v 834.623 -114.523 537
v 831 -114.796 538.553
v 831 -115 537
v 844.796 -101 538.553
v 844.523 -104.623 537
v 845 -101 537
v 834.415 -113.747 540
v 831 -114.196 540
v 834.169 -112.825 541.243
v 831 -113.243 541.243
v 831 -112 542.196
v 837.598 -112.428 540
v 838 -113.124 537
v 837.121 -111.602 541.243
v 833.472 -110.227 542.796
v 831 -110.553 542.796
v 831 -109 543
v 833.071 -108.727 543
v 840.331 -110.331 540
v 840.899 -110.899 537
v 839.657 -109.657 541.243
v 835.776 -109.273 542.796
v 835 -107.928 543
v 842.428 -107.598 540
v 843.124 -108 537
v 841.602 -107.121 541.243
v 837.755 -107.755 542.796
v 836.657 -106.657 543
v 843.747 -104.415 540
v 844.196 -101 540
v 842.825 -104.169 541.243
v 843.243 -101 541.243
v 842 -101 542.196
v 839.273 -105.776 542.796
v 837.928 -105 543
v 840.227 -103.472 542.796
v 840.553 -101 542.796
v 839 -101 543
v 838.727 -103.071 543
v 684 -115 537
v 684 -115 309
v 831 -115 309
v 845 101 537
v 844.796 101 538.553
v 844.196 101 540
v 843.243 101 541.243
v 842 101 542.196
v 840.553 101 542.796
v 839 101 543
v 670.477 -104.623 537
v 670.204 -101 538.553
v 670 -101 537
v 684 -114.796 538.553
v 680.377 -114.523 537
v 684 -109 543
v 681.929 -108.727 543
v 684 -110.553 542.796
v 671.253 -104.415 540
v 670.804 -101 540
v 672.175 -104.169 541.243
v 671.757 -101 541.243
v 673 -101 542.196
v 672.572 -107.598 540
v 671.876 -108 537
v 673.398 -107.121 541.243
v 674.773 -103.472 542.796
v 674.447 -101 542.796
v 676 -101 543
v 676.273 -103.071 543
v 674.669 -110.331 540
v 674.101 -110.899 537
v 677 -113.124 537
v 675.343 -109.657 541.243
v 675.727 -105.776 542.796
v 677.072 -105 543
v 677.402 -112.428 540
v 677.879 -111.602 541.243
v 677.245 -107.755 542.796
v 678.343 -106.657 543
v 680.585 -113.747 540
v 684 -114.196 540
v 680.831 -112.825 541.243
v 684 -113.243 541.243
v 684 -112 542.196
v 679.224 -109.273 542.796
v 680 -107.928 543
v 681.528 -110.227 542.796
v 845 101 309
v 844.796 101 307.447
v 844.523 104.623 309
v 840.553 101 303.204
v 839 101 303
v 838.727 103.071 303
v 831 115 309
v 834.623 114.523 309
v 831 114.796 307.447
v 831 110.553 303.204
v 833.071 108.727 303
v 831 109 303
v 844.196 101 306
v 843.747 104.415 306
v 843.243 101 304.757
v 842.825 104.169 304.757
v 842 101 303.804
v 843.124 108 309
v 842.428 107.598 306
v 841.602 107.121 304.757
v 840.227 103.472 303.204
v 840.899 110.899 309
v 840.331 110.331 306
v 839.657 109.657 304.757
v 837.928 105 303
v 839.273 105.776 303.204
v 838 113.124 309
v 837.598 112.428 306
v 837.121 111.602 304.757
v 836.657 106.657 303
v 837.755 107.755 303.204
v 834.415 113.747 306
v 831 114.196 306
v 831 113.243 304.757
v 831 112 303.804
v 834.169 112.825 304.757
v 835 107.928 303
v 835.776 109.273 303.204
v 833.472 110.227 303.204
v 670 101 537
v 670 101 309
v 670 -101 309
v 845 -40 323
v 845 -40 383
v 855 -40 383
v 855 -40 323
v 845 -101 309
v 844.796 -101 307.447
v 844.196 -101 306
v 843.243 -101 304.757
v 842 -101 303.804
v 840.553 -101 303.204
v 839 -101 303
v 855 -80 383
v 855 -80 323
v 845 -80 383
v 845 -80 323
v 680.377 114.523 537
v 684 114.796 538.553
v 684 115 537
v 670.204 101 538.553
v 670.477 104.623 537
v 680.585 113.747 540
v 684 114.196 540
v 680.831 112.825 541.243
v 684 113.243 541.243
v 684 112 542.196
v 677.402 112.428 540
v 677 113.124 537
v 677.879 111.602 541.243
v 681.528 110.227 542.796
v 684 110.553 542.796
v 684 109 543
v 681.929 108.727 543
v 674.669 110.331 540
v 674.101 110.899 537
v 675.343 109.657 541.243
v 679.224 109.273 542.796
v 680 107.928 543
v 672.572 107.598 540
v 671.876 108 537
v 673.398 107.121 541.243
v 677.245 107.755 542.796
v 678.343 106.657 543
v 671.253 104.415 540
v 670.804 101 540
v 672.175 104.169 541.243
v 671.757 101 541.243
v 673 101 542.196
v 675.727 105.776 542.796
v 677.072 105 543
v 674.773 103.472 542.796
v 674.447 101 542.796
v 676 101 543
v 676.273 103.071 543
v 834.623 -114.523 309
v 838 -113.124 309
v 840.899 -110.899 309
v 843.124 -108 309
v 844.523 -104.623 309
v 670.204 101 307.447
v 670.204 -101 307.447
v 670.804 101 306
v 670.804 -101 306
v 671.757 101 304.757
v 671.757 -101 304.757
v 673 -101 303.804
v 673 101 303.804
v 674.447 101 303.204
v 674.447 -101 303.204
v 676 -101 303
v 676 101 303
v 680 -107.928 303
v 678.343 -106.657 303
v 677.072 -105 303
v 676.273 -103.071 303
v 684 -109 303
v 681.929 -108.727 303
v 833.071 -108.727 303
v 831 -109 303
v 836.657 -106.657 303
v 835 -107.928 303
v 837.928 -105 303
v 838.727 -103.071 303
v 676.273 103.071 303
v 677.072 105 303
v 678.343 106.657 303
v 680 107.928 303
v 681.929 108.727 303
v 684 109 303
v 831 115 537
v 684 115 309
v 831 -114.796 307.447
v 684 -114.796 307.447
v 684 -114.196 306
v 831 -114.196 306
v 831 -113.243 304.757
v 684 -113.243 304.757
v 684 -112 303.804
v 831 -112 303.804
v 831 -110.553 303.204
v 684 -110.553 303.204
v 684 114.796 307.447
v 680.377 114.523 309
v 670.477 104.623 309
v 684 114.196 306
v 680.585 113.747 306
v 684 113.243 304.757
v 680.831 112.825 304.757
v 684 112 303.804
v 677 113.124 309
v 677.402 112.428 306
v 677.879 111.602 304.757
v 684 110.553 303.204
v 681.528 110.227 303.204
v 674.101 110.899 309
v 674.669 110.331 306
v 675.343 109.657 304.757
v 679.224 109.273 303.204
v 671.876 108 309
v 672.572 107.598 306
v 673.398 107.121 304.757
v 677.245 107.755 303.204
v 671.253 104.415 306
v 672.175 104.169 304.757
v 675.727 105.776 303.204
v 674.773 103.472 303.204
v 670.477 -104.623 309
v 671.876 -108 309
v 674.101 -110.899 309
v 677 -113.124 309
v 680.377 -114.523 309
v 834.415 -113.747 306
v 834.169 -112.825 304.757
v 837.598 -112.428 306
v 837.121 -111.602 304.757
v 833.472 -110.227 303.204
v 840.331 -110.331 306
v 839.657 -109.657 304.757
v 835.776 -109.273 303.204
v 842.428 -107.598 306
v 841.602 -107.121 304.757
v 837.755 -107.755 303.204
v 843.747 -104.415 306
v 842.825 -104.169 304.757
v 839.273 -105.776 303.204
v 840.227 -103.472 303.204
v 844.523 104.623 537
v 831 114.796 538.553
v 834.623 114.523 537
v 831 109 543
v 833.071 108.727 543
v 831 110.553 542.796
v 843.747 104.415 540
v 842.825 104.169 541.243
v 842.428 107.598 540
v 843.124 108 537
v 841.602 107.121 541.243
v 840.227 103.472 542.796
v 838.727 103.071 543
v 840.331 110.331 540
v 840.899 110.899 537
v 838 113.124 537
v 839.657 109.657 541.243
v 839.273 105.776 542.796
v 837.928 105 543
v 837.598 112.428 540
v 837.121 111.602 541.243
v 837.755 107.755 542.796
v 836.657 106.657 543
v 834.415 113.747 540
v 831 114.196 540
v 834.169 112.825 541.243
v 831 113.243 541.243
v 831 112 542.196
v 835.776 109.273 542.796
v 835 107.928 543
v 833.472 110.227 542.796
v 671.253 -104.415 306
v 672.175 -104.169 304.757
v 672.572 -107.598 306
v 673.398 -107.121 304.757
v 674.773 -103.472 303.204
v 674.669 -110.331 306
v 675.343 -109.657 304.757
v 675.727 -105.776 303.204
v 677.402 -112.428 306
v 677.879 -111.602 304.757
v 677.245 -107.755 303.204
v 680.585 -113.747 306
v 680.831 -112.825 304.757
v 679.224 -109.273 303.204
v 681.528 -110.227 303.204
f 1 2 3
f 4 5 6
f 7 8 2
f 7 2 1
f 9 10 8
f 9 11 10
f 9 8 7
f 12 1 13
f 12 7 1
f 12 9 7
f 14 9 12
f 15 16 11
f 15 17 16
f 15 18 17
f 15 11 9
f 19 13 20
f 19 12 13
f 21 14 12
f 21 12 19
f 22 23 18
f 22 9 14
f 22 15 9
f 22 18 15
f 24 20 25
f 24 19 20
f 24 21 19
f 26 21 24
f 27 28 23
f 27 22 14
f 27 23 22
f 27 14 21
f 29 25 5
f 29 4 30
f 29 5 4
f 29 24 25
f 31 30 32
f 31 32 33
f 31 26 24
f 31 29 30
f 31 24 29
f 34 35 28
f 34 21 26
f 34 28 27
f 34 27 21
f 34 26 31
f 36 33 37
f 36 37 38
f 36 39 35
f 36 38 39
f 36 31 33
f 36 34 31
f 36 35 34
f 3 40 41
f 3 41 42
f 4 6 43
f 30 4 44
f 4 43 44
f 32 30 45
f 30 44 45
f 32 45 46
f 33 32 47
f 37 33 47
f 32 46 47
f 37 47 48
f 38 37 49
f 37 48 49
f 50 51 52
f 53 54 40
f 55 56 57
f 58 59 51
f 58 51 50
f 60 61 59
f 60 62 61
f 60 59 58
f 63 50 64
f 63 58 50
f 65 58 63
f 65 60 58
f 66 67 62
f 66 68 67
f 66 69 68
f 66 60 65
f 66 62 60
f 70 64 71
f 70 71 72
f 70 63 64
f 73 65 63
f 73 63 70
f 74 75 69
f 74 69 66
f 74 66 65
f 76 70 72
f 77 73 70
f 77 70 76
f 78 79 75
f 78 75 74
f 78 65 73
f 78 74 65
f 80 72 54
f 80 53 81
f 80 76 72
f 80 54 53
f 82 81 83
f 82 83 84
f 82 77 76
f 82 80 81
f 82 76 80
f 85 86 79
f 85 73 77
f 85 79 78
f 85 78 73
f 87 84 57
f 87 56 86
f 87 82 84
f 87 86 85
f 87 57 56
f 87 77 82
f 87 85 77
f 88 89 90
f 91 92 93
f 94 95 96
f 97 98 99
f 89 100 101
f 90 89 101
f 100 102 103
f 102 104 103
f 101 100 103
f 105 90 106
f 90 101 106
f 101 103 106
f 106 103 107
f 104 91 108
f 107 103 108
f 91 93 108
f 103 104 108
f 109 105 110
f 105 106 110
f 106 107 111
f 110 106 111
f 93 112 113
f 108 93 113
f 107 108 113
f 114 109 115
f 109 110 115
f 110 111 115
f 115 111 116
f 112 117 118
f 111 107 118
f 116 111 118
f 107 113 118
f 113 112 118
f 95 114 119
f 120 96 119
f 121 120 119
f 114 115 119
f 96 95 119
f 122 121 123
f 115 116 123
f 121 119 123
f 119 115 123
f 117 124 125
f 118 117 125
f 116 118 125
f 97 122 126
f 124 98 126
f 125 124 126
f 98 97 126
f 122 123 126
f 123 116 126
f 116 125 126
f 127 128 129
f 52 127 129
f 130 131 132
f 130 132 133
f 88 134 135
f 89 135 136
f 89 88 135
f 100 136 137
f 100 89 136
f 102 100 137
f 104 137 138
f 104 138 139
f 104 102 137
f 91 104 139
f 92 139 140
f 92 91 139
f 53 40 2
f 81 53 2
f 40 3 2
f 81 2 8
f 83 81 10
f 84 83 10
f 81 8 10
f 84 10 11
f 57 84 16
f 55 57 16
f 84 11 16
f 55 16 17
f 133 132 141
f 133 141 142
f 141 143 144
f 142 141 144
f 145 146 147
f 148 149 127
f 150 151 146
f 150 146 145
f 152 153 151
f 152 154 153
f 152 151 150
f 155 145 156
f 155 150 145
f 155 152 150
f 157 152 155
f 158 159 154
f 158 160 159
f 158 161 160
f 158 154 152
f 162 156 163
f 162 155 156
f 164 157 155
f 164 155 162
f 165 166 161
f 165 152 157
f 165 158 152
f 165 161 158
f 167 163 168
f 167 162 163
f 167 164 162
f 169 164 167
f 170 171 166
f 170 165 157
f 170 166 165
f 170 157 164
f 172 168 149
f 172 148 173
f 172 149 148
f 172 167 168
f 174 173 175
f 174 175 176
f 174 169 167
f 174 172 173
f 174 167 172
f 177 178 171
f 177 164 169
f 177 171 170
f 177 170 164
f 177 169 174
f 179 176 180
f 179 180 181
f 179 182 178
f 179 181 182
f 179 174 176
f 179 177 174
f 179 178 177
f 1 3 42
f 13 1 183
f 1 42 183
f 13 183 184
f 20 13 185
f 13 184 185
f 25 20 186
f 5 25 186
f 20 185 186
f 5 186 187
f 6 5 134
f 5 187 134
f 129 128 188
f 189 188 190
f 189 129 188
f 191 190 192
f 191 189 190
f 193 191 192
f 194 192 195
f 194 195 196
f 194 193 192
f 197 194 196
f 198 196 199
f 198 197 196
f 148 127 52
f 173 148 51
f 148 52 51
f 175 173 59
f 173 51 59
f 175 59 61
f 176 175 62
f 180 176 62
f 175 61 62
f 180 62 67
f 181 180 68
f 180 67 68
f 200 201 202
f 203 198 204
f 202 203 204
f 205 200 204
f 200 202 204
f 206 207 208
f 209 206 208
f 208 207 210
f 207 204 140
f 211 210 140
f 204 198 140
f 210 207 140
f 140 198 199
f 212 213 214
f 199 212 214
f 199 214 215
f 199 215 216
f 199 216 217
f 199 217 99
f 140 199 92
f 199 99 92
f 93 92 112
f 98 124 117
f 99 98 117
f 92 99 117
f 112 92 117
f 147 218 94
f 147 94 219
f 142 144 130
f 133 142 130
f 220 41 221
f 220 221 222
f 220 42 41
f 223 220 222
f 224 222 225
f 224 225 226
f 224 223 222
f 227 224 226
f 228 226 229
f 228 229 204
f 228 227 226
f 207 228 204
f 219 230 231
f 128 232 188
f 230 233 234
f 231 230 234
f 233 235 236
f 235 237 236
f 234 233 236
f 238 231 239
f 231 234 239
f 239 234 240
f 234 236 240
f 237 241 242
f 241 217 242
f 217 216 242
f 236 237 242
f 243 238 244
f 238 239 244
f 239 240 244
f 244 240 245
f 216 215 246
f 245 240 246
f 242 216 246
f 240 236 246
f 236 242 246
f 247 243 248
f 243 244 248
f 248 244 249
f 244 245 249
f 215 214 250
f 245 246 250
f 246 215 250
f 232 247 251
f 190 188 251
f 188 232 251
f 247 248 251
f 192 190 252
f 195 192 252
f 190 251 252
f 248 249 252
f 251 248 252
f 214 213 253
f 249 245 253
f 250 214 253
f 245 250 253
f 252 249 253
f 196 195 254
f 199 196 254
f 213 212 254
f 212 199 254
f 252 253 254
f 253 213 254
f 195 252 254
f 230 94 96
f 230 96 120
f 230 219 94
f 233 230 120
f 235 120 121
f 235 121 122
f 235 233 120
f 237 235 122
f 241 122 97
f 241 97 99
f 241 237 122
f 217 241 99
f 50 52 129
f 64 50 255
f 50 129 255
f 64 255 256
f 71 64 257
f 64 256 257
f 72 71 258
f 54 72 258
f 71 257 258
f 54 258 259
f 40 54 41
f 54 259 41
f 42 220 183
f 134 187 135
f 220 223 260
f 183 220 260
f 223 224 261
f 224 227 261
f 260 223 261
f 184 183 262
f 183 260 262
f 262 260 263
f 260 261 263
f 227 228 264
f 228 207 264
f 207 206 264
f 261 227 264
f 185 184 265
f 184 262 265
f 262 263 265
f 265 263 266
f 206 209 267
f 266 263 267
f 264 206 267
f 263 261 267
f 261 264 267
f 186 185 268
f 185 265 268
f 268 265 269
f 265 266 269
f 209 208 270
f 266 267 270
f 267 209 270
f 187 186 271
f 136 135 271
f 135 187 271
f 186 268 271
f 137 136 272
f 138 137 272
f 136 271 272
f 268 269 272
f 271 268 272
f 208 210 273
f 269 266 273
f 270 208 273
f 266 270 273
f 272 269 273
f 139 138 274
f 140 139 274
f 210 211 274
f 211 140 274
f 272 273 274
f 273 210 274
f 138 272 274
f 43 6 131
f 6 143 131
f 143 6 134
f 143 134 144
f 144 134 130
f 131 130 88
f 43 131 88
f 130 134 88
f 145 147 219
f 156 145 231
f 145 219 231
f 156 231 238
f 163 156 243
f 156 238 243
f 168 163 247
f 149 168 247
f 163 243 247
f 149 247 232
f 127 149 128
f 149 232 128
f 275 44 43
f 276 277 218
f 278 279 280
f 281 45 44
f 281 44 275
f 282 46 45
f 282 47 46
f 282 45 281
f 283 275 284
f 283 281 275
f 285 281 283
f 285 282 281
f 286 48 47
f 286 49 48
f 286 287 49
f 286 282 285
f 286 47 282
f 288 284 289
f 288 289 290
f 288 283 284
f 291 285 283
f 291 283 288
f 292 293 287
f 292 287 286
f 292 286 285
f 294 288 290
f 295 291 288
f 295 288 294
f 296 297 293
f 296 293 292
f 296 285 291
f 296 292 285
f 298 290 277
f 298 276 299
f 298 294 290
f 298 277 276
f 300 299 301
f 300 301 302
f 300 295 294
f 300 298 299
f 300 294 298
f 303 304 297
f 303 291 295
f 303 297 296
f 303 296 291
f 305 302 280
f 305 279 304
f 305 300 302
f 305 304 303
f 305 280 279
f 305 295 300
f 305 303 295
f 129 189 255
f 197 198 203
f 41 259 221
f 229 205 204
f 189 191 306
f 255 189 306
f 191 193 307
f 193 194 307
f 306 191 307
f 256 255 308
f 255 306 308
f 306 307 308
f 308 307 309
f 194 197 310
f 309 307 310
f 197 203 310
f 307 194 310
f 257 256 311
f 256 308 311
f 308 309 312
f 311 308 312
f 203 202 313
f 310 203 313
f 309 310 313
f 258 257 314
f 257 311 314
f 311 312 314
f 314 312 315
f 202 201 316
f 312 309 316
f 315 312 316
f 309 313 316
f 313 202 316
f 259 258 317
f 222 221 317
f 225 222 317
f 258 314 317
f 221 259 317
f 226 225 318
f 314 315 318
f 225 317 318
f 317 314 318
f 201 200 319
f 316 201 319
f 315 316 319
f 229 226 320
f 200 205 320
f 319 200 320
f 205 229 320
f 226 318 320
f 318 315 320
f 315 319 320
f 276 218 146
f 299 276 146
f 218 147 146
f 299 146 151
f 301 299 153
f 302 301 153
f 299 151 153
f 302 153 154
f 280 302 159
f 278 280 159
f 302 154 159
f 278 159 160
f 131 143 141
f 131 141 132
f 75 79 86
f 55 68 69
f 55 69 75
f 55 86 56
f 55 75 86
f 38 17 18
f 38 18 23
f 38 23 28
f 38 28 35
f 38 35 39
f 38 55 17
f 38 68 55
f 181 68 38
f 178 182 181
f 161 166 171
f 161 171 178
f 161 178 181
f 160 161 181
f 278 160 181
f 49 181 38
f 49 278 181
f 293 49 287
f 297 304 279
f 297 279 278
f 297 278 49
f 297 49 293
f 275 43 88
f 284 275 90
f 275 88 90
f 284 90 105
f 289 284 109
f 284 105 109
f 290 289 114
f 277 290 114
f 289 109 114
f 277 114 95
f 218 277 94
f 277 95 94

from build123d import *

# Parameters (mm, degrees)
BLOCK_START            = 303
BLOCK_1_DEPTH          = 240
BLOCK_EDGE_FILLET_1_R  = 6
EXTRUDE_SKETCH_1_W     = 60
EXTRUDE_SKETCH_1_H     = 40
EXTRUDE_1_DEPTH        = 10
EXTRUDE_ROTATE_1_ANGLE = 90


with BuildPart() as part:
    # Block sketch 1 → Block 1 (new body)
    with BuildSketch(Plane.XY.offset(BLOCK_START)):
        with BuildLine():
            Line((684, -115), (831, -115))
            ThreePointArc((831, -115), (840.899494937, -110.899494937), (845, -101))
            Line((845, -101), (845, 101))
            ThreePointArc((845, 101), (840.899494937, 110.899494937), (831, 115))
            Line((831, 115), (684, 115))
            ThreePointArc((684, 115), (674.100505063, 110.899494937), (670, 101))
            Line((670, 101), (670, -101))
            ThreePointArc((670, -101), (674.100505063, -110.899494937), (684, -115))
        make_face()
    extrude(amount=BLOCK_1_DEPTH)

    # Block edge fillet 1
    block_edge_fillet_1_edges = [part.edges().sort_by_distance(p)[0] for p in [
        (845, 0, 303),
        (840.899494937, -110.899494937, 303),
        (757.5, -115, 303),
        (674.100505063, -110.899494937, 303),
        (840.899494937, -110.899494937, 543),
        (845, 0, 543),
        (840.899494937, 110.899494937, 543),
        (757.5, 115, 543),
        (674.100505063, 110.899494937, 543),
        (670, 0, 543),
        (674.100505063, -110.899494937, 543),
        (670, 0, 303),
        (757.5, -115, 543),
        (674.100505063, 110.899494937, 303),
        (757.5, 115, 303),
        (840.899494937, 110.899494937, 303),
    ]]
    fillet(block_edge_fillet_1_edges, radius=BLOCK_EDGE_FILLET_1_R)


with BuildPart() as body_2:
    # Extrude sketch 1 → Extrude 1 (new body)
    with BuildSketch(Plane.XY):
        Rectangle(EXTRUDE_SKETCH_1_W, EXTRUDE_SKETCH_1_H)
    extrude(amount=EXTRUDE_1_DEPTH)


with BuildPart() as body_2_1:
    # Extrude rotate 1: moved
    add(body_2.part.rotate(Axis((0, 0, 0), (0, 1, 0)), EXTRUDE_ROTATE_1_ANGLE))


with BuildPart() as body_2_2:
    # Extrude place 1: moved
    add(body_2_1.part.moved(Location((845, -60, 353))))

    # Combine (weld / assembly of features): union part
    add(part.part)


solid = body_2_2.part
